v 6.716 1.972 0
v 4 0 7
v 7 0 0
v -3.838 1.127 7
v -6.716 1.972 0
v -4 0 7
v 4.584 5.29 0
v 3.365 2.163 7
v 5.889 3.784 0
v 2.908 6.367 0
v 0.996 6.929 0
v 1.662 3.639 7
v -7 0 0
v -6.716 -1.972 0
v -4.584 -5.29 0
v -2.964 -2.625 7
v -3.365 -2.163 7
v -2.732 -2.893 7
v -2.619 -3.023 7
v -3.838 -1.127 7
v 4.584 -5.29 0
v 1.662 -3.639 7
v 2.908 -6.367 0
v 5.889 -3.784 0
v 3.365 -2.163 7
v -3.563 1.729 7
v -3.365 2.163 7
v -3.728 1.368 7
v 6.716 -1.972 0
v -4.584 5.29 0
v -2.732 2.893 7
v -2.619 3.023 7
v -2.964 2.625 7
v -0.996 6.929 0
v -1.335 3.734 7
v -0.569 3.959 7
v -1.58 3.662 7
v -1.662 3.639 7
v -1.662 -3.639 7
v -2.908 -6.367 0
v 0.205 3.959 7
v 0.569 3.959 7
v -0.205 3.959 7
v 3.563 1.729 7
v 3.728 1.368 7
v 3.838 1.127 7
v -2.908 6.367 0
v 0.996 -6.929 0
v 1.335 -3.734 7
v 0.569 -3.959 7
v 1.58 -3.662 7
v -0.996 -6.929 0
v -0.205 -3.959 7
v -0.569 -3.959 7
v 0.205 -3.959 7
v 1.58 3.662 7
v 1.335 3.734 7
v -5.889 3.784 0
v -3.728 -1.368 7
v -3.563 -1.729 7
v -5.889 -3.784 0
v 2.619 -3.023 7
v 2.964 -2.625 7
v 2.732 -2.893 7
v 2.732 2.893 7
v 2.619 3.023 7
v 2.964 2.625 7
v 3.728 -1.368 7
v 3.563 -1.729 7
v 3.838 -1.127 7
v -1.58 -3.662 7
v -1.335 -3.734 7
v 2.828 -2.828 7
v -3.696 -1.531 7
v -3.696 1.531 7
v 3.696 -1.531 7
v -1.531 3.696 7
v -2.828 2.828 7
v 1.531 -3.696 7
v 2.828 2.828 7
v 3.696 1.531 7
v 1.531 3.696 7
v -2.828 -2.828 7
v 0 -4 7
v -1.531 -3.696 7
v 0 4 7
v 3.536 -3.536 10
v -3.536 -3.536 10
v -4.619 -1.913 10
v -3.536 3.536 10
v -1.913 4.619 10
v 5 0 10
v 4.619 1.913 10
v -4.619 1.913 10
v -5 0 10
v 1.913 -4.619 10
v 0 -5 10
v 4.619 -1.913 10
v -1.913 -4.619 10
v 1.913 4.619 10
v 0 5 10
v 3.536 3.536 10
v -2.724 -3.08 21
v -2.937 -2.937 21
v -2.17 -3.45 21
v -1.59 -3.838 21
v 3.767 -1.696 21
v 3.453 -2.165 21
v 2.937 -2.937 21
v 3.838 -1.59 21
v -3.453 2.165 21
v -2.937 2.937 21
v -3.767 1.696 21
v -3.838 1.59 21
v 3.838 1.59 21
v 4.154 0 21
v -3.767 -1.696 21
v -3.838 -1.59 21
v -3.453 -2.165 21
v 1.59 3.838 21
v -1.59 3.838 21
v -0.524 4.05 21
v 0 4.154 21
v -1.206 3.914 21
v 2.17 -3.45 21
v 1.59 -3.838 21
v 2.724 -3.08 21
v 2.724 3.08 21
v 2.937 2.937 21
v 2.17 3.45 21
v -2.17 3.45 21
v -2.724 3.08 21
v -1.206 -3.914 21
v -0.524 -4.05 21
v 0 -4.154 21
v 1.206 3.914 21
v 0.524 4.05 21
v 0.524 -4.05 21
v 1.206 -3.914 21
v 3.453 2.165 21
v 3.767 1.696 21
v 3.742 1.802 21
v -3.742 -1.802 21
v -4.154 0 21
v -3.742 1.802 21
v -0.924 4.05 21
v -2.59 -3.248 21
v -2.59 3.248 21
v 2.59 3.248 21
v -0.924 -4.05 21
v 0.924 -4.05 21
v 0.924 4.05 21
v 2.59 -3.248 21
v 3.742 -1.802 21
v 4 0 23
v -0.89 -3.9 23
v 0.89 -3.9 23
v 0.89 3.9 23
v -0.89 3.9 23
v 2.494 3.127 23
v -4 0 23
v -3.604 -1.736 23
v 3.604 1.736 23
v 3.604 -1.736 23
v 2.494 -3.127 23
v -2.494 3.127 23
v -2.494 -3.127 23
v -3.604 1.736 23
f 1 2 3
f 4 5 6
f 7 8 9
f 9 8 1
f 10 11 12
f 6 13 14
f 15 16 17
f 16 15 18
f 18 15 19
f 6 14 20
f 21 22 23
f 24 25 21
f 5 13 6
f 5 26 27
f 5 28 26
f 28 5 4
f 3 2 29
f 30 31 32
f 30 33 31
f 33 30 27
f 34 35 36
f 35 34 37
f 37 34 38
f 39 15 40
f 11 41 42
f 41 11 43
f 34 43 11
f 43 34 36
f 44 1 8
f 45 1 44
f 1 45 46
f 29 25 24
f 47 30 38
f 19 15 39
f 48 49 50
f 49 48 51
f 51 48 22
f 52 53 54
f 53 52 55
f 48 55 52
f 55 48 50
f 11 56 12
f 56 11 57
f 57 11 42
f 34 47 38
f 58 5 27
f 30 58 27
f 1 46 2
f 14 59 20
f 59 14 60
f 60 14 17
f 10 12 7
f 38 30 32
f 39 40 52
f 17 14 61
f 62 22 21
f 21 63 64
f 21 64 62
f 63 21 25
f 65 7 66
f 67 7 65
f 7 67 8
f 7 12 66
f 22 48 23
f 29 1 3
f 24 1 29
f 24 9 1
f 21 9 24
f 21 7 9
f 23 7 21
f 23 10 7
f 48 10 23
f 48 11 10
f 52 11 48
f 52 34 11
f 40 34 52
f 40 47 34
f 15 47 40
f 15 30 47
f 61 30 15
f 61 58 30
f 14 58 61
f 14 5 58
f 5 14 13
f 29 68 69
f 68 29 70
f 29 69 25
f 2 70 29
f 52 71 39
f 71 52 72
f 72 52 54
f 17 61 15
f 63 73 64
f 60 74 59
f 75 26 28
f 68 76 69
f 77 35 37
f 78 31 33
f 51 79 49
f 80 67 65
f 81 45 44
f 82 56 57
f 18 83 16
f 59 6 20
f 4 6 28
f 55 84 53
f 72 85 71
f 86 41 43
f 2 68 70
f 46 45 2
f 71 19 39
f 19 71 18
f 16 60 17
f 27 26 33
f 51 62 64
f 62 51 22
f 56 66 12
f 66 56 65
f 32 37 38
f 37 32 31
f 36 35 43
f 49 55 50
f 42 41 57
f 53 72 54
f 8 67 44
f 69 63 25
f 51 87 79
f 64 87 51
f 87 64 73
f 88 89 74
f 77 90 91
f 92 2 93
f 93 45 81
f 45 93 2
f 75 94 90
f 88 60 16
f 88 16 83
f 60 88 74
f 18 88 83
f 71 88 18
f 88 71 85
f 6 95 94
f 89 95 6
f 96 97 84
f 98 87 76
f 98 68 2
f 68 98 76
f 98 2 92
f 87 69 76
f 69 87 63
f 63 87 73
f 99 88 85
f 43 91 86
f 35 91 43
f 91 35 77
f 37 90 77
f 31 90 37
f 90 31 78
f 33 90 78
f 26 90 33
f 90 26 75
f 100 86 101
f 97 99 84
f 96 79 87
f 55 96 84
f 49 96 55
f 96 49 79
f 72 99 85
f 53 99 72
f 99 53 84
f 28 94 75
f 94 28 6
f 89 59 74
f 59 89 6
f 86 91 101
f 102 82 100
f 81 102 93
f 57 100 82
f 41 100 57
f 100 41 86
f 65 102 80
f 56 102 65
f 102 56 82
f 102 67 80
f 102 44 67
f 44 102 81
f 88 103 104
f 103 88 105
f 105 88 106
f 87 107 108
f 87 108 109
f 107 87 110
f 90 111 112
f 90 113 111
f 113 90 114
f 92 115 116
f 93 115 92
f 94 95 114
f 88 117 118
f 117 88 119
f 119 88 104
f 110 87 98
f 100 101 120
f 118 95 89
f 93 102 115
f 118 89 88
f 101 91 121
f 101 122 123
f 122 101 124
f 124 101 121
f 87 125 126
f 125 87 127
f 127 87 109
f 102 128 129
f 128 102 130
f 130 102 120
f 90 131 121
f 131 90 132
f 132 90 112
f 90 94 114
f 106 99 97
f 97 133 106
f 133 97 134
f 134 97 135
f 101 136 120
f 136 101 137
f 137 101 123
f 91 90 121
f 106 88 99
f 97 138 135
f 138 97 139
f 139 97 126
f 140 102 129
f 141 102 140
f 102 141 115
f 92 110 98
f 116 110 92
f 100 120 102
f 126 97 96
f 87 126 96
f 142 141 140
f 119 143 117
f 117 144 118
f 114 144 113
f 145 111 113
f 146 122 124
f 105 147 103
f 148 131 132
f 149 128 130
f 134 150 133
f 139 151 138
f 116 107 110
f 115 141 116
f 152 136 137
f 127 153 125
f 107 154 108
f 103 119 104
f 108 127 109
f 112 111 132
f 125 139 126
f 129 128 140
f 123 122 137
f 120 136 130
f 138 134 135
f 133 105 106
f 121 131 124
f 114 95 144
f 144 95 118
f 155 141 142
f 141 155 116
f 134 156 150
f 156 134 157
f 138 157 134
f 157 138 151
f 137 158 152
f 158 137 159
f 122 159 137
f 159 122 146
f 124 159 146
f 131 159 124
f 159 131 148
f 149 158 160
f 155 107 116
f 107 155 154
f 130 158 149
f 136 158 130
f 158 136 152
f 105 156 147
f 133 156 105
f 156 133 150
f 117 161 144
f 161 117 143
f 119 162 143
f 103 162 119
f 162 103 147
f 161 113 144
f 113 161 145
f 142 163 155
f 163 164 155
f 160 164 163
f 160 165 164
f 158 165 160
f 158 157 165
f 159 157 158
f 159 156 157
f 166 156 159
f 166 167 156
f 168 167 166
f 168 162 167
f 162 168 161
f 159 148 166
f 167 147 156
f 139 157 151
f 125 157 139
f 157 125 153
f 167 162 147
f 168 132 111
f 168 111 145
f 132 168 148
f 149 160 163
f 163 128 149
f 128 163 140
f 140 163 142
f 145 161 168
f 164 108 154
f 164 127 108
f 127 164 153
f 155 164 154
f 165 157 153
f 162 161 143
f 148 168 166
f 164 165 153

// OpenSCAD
module lamp(r_top, r_lamp, r_middle, r_base, h_top, h_lamp, h_base_top, h_base_bottom) {
    
    // Poprawiona formuła r_upper_lamp
    r_upper_lamp = r_top+(((r_lamp - r_top)*h_top) / (h_lamp + h_top));
    
    // Podstawa
    cylinder(h_base_bottom, r1=r_base, r2=r_middle);

    // Górna część podstawy
    translate([0,0,h_base_bottom])
    cylinder(h_base_top, r1=r_middle, r2=r_lamp);

    // Główna część lampy
    translate([0,0,h_base_bottom + h_base_top])
    cylinder(h_lamp, r1=r_lamp, r2=r_upper_lamp);

    // Górna część lampy
    translate([0,0,h_base_bottom + h_base_top + h_lamp])
    cylinder(h_top, r1=r_upper_lamp, r2=r_top);
}

lamp(
    r_top = 4,
    r_lamp = 5,
    r_middle = 4,
    r_base = 7,
    h_top = 2,
    h_lamp = 11,
    h_base_top = 3,
    h_base_bottom = 7
);
